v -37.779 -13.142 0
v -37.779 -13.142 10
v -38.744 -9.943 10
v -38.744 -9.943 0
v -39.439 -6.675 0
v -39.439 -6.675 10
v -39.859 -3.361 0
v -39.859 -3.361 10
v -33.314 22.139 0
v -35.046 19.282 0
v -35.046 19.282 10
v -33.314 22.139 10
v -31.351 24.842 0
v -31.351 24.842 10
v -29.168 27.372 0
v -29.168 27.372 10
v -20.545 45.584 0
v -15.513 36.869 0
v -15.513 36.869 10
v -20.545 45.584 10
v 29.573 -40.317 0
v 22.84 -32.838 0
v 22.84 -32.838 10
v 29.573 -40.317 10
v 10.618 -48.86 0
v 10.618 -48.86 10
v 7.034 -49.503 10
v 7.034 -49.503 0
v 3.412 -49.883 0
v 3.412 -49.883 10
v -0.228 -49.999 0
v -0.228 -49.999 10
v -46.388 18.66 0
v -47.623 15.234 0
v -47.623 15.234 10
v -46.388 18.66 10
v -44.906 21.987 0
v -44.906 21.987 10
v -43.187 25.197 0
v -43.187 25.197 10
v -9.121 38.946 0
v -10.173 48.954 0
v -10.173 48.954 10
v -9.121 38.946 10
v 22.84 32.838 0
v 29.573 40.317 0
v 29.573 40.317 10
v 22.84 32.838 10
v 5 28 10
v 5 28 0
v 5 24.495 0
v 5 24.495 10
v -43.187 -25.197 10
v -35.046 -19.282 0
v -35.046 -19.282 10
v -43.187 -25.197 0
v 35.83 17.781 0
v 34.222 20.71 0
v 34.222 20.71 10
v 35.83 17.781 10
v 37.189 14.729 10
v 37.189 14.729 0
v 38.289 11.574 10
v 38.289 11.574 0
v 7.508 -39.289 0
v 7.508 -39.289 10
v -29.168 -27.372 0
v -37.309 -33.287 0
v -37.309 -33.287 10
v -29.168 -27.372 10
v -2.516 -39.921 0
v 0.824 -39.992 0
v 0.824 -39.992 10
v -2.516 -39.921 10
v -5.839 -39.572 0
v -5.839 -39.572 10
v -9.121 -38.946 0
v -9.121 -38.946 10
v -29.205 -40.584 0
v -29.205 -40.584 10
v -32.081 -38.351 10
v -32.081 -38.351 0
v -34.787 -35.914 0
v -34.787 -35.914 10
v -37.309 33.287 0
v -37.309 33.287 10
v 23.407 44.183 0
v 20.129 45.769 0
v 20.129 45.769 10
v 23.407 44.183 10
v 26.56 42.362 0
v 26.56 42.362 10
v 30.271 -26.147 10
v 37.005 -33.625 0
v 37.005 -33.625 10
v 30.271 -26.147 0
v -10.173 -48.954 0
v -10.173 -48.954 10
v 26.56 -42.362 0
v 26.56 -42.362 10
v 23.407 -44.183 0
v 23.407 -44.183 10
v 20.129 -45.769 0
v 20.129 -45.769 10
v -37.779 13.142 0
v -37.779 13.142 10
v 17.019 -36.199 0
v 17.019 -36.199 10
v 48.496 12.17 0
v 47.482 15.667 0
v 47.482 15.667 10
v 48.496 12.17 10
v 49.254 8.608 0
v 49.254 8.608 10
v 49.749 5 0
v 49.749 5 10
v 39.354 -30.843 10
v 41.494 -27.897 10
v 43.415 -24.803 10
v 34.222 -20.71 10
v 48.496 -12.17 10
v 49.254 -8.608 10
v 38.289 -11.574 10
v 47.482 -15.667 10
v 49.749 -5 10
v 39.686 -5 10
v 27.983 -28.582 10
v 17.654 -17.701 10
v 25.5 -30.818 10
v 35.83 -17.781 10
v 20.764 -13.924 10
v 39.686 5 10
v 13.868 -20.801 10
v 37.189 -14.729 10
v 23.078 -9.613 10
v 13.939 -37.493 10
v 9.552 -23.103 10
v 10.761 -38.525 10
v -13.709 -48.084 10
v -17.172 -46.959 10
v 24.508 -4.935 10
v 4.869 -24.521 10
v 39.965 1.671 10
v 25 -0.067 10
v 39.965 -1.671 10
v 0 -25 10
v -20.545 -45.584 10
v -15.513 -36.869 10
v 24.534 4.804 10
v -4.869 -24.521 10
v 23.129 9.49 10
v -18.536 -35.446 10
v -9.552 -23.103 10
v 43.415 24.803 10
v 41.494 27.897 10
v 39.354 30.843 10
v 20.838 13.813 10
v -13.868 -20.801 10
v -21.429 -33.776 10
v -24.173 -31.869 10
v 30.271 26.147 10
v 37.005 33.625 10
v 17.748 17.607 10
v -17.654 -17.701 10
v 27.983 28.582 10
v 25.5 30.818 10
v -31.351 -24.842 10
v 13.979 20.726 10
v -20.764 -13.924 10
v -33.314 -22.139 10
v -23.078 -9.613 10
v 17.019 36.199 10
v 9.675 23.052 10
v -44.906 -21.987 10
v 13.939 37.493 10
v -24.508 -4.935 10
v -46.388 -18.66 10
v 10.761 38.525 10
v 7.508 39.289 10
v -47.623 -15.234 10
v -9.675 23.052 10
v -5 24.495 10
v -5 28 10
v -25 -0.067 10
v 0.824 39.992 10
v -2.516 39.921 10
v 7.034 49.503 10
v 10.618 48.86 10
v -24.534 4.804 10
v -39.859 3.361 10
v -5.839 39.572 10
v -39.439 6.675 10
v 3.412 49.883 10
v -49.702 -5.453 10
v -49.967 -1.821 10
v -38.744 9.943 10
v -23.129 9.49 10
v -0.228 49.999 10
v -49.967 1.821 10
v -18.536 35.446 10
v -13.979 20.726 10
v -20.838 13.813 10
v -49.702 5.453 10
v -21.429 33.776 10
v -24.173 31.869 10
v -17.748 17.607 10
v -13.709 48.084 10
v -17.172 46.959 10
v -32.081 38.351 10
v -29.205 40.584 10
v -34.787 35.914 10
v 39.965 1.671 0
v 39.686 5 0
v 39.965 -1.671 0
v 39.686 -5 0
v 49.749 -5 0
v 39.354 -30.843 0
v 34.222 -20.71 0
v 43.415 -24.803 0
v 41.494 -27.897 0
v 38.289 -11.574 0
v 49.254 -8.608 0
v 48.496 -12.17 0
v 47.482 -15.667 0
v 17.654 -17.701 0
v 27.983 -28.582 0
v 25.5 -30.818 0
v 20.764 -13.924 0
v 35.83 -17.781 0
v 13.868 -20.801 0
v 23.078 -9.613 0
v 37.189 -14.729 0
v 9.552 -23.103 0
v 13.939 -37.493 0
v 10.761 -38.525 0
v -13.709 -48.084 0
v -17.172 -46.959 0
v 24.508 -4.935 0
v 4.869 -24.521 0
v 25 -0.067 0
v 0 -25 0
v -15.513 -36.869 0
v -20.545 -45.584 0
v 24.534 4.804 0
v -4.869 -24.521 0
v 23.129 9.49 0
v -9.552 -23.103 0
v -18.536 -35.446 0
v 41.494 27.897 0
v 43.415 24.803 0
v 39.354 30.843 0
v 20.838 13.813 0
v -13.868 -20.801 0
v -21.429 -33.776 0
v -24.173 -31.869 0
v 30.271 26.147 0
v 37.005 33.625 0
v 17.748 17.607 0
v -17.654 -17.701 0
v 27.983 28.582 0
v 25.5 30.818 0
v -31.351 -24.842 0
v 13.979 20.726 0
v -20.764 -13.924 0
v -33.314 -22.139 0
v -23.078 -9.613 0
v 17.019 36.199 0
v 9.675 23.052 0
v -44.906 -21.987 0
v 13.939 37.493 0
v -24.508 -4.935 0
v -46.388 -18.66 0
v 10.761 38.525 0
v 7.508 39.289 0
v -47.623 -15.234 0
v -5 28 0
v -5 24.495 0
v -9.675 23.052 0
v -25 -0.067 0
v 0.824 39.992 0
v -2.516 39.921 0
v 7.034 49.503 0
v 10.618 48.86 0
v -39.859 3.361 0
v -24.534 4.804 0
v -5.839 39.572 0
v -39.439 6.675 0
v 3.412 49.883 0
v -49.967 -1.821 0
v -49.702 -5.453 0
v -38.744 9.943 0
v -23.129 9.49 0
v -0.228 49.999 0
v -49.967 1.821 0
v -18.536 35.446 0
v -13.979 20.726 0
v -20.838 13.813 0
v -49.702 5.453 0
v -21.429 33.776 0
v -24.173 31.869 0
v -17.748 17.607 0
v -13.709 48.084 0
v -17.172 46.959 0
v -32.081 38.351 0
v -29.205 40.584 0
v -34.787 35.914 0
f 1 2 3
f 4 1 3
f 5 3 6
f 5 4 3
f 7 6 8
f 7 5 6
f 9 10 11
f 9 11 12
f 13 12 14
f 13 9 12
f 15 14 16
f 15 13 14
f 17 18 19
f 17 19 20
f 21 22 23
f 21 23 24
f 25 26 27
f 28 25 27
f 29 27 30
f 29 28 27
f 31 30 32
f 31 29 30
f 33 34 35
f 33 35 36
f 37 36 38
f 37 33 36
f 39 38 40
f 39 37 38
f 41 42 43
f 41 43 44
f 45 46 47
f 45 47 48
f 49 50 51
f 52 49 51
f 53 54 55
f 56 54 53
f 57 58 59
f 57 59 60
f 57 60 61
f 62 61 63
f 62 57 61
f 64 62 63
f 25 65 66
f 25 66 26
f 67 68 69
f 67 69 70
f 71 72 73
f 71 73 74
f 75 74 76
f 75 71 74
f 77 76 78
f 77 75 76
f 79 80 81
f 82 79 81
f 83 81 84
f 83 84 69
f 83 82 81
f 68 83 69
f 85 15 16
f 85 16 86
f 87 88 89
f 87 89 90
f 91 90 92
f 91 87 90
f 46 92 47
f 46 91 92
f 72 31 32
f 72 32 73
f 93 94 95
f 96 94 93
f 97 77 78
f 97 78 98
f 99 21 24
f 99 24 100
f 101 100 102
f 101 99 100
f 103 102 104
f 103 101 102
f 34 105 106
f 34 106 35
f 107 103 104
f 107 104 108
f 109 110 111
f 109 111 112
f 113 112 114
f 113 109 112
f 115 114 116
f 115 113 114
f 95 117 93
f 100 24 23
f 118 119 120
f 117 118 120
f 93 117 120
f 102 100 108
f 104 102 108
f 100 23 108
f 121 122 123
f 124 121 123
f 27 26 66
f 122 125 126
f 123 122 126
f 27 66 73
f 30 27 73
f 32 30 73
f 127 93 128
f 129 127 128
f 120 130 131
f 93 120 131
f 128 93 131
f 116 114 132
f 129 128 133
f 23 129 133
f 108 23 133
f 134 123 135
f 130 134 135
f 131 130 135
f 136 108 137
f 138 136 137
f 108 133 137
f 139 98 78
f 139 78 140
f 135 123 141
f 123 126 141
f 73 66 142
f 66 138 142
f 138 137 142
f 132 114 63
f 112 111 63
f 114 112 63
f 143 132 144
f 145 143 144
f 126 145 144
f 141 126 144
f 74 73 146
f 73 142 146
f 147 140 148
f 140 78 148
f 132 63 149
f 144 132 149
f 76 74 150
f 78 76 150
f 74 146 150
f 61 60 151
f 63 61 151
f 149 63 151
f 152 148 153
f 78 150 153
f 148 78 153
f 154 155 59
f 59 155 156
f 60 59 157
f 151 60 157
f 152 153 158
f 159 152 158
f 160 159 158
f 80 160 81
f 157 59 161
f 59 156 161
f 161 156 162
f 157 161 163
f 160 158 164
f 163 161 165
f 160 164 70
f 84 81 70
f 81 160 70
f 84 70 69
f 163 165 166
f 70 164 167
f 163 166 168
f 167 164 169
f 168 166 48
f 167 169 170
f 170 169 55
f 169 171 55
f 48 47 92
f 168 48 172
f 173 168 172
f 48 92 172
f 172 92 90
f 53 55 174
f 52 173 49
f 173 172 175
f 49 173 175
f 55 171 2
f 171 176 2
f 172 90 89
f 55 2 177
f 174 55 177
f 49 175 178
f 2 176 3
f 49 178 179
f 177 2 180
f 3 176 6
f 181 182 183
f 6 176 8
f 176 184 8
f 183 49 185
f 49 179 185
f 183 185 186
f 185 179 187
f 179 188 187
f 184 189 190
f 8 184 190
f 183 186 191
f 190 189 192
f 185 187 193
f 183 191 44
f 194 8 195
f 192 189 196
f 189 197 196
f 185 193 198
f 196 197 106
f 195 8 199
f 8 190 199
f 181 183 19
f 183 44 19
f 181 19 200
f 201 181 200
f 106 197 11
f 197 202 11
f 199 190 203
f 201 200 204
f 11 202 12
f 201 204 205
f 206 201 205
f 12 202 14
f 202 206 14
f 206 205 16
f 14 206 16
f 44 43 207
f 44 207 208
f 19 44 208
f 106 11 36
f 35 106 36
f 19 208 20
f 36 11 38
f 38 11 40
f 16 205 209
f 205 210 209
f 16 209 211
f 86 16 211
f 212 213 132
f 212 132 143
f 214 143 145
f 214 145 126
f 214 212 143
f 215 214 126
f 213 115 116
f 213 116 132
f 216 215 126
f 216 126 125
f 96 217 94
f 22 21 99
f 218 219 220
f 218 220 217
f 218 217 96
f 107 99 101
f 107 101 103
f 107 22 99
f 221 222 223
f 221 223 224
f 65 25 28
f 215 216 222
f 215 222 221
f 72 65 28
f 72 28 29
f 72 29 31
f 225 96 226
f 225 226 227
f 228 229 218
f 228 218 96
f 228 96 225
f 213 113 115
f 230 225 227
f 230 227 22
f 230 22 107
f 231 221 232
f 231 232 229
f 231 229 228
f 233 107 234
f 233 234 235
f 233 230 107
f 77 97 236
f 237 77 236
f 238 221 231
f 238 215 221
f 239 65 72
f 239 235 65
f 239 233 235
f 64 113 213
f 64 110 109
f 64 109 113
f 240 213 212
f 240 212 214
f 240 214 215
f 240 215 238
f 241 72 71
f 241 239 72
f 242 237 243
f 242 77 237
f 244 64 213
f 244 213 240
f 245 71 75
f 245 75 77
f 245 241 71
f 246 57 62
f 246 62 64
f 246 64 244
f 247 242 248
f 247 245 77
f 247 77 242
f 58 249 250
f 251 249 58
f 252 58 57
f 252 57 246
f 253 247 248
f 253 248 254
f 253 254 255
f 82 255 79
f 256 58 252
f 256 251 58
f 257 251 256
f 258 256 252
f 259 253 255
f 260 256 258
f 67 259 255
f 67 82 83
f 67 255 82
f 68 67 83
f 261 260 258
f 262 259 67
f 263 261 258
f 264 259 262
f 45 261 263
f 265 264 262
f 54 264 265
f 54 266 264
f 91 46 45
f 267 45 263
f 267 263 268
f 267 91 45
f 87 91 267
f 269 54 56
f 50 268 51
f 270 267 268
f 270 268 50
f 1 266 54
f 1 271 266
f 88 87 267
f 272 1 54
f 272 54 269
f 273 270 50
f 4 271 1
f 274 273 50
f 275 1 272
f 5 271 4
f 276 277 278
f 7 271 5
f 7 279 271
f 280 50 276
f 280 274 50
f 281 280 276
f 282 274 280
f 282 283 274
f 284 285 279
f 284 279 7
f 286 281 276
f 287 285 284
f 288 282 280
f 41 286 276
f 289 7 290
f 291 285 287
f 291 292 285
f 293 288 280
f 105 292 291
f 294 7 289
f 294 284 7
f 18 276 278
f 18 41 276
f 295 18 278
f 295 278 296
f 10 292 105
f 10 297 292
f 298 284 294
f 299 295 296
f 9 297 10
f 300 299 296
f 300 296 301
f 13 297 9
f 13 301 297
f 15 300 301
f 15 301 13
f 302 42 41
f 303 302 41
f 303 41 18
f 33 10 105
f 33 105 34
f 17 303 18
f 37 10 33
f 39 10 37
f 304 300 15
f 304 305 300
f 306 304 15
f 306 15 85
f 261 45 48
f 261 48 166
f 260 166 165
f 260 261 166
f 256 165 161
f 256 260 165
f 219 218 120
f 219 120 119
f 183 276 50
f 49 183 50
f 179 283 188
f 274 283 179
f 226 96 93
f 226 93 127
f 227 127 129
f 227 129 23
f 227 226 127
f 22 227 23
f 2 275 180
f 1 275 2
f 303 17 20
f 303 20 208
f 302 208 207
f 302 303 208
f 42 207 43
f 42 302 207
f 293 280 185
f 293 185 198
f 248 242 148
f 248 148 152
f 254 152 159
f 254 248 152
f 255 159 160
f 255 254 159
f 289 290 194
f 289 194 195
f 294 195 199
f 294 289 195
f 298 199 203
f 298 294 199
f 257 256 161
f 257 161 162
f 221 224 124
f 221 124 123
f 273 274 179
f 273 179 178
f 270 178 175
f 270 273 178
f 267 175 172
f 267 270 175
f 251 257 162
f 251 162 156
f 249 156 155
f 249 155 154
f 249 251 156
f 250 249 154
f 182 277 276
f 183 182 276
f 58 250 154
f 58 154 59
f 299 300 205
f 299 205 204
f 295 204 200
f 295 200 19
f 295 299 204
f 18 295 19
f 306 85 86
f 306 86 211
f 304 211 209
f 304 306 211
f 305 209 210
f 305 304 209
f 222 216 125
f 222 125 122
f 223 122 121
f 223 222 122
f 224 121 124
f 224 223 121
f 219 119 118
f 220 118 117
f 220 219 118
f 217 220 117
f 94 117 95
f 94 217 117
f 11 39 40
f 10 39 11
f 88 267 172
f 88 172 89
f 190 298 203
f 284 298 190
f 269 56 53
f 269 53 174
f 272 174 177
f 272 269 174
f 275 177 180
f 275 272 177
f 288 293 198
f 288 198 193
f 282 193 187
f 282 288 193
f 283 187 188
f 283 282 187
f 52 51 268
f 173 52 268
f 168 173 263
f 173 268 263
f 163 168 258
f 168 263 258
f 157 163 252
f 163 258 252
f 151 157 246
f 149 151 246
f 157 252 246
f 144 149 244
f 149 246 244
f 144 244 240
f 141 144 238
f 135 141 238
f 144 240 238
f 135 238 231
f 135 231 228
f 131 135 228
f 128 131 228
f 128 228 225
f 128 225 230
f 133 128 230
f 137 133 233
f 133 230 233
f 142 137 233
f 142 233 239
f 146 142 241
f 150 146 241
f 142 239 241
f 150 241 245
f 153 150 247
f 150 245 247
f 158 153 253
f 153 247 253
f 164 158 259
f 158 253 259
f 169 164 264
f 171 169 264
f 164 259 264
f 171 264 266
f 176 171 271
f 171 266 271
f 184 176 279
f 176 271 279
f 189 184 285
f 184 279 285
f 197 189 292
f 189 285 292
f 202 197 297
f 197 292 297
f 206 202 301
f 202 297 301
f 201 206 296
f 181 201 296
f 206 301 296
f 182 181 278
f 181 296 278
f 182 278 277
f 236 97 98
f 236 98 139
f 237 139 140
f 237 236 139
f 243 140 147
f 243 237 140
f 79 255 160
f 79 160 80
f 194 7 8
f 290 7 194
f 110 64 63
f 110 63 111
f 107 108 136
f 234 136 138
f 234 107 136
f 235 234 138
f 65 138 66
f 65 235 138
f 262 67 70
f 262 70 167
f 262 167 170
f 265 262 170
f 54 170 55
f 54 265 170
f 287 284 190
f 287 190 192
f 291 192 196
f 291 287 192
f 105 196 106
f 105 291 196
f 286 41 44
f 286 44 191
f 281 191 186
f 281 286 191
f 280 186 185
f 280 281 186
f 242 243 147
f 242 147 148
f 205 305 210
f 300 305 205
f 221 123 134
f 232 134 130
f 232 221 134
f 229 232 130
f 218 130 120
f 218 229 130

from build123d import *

# Parameters (mm, degrees)
BOSS_EXTRUDE2_DEPTH = 10


with BuildPart() as part:
    # Sketch1 → Boss-Extrude2 (new body)
    with BuildSketch(Plane.XY):
        with BuildLine():
            Line((39.686269666, -5), (49.749371855, -5))
            ThreePointArc((49.749371855, -5), (48.907380037, -10.395584541), (47.481995894, -15.667165215))
            Line((47.481995894, -15.667165215), (38.2888946, -11.574132812))
            ThreePointArc((38.2888946, -11.574132812), (36.541818306, -16.269465723), (34.221528169, -20.709587388))
            Line((34.221528169, -20.709587388), (43.414629464, -24.802619792))
            ThreePointArc((43.414629464, -24.802619792), (40.450849719, -29.389262615), (37.004551483, -33.625335233))
            Line((37.004551483, -33.625335233), (30.271021813, -26.146992913))
            ThreePointArc((30.271021813, -26.146992913), (26.765224254, -29.725793019), (22.839573558, -32.838298977))
            Line((22.839573558, -32.838298977), (29.573103228, -40.316641297))
            ThreePointArc((29.573103228, -40.316641297), (25, -43.301270189), (20.128683944, -45.769379313))
            Line((20.128683944, -45.769379313), (17.019014352, -36.198800401))
            ThreePointArc((17.019014352, -36.198800401), (12.360679775, -38.042260652), (7.508449189, -39.288970345))
            Line((7.508449189, -39.288970345), (10.618118781, -48.859549256))
            ThreePointArc((10.618118781, -48.859549256), (5.226423163, -49.726094768), (-0.227615912, -49.999481907))
            Line((-0.227615912, -49.999481907), (0.824264696, -39.991506445))
            ThreePointArc((0.824264696, -39.991506445), (-4.181138531, -39.780875815), (-9.120954258, -38.946221812))
            Line((-9.120954258, -38.946221812), (-10.172834865, -48.954197275))
            ThreePointArc((-10.172834865, -48.954197275), (-15.450849719, -47.552825815), (-20.544558909, -45.584219849))
            Line((-20.544558909, -45.584219849), (-15.513007814, -36.869317712))
            ThreePointArc((-15.513007814, -36.869317712), (-20, -34.641016151), (-24.173261852, -31.869317712))
            Line((-24.173261852, -31.869317712), (-29.204812947, -40.584219849))
            ThreePointArc((-29.204812947, -40.584219849), (-33.456530318, -37.157241274), (-37.309161029, -33.287032059))
            Line((-37.309161029, -33.287032059), (-29.167940342, -27.372089))
            ThreePointArc((-29.167940342, -27.372089), (-32.360679775, -23.511410092), (-35.045792865, -19.281919056))
            Line((-35.045792865, -19.281919056), (-43.187013552, -25.196862116))
            ThreePointArc((-43.187013552, -25.196862116), (-45.677272882, -20.336832154), (-47.622670264, -15.234214023))
            Line((-47.622670264, -15.234214023), (-37.779471002, -13.141977432))
            ThreePointArc((-37.779471002, -13.141977432), (-39.125904029, -8.316467633), (-39.85858791, -3.360501425))
            Line((-39.85858791, -3.360501425), (-49.701787172, -5.452738016))
            ThreePointArc((-49.701787172, -5.452738016), (-50, 0), (-49.701787172, 5.452738016))
            Line((-49.701787172, 5.452738016), (-39.85858791, 3.360501425))
            ThreePointArc((-39.85858791, 3.360501425), (-39.125904029, 8.316467633), (-37.779471002, 13.141977432))
            Line((-37.779471002, 13.141977432), (-47.622670264, 15.234214023))
            ThreePointArc((-47.622670264, 15.234214023), (-45.677272882, 20.336832154), (-43.187013552, 25.196862116))
            Line((-43.187013552, 25.196862116), (-35.045792865, 19.281919056))
            ThreePointArc((-35.045792865, 19.281919056), (-32.360679775, 23.511410092), (-29.167940342, 27.372089))
            Line((-29.167940342, 27.372089), (-37.309161029, 33.287032059))
            ThreePointArc((-37.309161029, 33.287032059), (-33.456530318, 37.157241274), (-29.204812947, 40.584219849))
            Line((-29.204812947, 40.584219849), (-24.173261852, 31.869317712))
            ThreePointArc((-24.173261852, 31.869317712), (-20, 34.641016151), (-15.513007814, 36.869317712))
            Line((-15.513007814, 36.869317712), (-20.544558909, 45.584219849))
            ThreePointArc((-20.544558909, 45.584219849), (-15.450849719, 47.552825815), (-10.172834865, 48.954197275))
            Line((-10.172834865, 48.954197275), (-9.120954258, 38.946221812))
            ThreePointArc((-9.120954258, 38.946221812), (-4.181138531, 39.780875815), (0.824264696, 39.991506445))
            Line((0.824264696, 39.991506445), (-0.227615912, 49.999481907))
            ThreePointArc((-0.227615912, 49.999481907), (5.226423163, 49.726094768), (10.618118781, 48.859549256))
            Line((10.618118781, 48.859549256), (7.508449189, 39.288970345))
            ThreePointArc((7.508449189, 39.288970345), (12.360679775, 38.042260652), (17.019014352, 36.198800401))
            Line((17.019014352, 36.198800401), (20.128683944, 45.769379313))
            ThreePointArc((20.128683944, 45.769379313), (25, 43.301270189), (29.573103228, 40.316641297))
            Line((29.573103228, 40.316641297), (22.839573558, 32.838298977))
            ThreePointArc((22.839573558, 32.838298977), (26.765224254, 29.725793019), (30.271021813, 26.146992913))
            Line((30.271021813, 26.146992913), (37.004551483, 33.625335233))
            ThreePointArc((37.004551483, 33.625335233), (40.450849719, 29.389262615), (43.414629464, 24.802619792))
            Line((43.414629464, 24.802619792), (34.221528169, 20.709587388))
            ThreePointArc((34.221528169, 20.709587388), (36.541818306, 16.269465723), (38.2888946, 11.574132812))
            Line((38.2888946, 11.574132812), (47.481995894, 15.667165215))
            ThreePointArc((47.481995894, 15.667165215), (48.907380037, 10.395584541), (49.749371855, 5))
            Line((49.749371855, 5), (39.686269666, 5))
            ThreePointArc((39.686269666, 5), (40, 0), (39.686269666, -5))
        make_face()
        with BuildLine():
            Line((-5, 24.494897428), (-5, 28))
            Line((-5, 28), (5, 28))
            Line((5, 28), (5, 24.494897428))
            ThreePointArc((5, 24.494897428), (0, -25), (-5, 24.494897428))
        make_face(mode=Mode.SUBTRACT)
    extrude(amount=BOSS_EXTRUDE2_DEPTH)


solid = part.part
